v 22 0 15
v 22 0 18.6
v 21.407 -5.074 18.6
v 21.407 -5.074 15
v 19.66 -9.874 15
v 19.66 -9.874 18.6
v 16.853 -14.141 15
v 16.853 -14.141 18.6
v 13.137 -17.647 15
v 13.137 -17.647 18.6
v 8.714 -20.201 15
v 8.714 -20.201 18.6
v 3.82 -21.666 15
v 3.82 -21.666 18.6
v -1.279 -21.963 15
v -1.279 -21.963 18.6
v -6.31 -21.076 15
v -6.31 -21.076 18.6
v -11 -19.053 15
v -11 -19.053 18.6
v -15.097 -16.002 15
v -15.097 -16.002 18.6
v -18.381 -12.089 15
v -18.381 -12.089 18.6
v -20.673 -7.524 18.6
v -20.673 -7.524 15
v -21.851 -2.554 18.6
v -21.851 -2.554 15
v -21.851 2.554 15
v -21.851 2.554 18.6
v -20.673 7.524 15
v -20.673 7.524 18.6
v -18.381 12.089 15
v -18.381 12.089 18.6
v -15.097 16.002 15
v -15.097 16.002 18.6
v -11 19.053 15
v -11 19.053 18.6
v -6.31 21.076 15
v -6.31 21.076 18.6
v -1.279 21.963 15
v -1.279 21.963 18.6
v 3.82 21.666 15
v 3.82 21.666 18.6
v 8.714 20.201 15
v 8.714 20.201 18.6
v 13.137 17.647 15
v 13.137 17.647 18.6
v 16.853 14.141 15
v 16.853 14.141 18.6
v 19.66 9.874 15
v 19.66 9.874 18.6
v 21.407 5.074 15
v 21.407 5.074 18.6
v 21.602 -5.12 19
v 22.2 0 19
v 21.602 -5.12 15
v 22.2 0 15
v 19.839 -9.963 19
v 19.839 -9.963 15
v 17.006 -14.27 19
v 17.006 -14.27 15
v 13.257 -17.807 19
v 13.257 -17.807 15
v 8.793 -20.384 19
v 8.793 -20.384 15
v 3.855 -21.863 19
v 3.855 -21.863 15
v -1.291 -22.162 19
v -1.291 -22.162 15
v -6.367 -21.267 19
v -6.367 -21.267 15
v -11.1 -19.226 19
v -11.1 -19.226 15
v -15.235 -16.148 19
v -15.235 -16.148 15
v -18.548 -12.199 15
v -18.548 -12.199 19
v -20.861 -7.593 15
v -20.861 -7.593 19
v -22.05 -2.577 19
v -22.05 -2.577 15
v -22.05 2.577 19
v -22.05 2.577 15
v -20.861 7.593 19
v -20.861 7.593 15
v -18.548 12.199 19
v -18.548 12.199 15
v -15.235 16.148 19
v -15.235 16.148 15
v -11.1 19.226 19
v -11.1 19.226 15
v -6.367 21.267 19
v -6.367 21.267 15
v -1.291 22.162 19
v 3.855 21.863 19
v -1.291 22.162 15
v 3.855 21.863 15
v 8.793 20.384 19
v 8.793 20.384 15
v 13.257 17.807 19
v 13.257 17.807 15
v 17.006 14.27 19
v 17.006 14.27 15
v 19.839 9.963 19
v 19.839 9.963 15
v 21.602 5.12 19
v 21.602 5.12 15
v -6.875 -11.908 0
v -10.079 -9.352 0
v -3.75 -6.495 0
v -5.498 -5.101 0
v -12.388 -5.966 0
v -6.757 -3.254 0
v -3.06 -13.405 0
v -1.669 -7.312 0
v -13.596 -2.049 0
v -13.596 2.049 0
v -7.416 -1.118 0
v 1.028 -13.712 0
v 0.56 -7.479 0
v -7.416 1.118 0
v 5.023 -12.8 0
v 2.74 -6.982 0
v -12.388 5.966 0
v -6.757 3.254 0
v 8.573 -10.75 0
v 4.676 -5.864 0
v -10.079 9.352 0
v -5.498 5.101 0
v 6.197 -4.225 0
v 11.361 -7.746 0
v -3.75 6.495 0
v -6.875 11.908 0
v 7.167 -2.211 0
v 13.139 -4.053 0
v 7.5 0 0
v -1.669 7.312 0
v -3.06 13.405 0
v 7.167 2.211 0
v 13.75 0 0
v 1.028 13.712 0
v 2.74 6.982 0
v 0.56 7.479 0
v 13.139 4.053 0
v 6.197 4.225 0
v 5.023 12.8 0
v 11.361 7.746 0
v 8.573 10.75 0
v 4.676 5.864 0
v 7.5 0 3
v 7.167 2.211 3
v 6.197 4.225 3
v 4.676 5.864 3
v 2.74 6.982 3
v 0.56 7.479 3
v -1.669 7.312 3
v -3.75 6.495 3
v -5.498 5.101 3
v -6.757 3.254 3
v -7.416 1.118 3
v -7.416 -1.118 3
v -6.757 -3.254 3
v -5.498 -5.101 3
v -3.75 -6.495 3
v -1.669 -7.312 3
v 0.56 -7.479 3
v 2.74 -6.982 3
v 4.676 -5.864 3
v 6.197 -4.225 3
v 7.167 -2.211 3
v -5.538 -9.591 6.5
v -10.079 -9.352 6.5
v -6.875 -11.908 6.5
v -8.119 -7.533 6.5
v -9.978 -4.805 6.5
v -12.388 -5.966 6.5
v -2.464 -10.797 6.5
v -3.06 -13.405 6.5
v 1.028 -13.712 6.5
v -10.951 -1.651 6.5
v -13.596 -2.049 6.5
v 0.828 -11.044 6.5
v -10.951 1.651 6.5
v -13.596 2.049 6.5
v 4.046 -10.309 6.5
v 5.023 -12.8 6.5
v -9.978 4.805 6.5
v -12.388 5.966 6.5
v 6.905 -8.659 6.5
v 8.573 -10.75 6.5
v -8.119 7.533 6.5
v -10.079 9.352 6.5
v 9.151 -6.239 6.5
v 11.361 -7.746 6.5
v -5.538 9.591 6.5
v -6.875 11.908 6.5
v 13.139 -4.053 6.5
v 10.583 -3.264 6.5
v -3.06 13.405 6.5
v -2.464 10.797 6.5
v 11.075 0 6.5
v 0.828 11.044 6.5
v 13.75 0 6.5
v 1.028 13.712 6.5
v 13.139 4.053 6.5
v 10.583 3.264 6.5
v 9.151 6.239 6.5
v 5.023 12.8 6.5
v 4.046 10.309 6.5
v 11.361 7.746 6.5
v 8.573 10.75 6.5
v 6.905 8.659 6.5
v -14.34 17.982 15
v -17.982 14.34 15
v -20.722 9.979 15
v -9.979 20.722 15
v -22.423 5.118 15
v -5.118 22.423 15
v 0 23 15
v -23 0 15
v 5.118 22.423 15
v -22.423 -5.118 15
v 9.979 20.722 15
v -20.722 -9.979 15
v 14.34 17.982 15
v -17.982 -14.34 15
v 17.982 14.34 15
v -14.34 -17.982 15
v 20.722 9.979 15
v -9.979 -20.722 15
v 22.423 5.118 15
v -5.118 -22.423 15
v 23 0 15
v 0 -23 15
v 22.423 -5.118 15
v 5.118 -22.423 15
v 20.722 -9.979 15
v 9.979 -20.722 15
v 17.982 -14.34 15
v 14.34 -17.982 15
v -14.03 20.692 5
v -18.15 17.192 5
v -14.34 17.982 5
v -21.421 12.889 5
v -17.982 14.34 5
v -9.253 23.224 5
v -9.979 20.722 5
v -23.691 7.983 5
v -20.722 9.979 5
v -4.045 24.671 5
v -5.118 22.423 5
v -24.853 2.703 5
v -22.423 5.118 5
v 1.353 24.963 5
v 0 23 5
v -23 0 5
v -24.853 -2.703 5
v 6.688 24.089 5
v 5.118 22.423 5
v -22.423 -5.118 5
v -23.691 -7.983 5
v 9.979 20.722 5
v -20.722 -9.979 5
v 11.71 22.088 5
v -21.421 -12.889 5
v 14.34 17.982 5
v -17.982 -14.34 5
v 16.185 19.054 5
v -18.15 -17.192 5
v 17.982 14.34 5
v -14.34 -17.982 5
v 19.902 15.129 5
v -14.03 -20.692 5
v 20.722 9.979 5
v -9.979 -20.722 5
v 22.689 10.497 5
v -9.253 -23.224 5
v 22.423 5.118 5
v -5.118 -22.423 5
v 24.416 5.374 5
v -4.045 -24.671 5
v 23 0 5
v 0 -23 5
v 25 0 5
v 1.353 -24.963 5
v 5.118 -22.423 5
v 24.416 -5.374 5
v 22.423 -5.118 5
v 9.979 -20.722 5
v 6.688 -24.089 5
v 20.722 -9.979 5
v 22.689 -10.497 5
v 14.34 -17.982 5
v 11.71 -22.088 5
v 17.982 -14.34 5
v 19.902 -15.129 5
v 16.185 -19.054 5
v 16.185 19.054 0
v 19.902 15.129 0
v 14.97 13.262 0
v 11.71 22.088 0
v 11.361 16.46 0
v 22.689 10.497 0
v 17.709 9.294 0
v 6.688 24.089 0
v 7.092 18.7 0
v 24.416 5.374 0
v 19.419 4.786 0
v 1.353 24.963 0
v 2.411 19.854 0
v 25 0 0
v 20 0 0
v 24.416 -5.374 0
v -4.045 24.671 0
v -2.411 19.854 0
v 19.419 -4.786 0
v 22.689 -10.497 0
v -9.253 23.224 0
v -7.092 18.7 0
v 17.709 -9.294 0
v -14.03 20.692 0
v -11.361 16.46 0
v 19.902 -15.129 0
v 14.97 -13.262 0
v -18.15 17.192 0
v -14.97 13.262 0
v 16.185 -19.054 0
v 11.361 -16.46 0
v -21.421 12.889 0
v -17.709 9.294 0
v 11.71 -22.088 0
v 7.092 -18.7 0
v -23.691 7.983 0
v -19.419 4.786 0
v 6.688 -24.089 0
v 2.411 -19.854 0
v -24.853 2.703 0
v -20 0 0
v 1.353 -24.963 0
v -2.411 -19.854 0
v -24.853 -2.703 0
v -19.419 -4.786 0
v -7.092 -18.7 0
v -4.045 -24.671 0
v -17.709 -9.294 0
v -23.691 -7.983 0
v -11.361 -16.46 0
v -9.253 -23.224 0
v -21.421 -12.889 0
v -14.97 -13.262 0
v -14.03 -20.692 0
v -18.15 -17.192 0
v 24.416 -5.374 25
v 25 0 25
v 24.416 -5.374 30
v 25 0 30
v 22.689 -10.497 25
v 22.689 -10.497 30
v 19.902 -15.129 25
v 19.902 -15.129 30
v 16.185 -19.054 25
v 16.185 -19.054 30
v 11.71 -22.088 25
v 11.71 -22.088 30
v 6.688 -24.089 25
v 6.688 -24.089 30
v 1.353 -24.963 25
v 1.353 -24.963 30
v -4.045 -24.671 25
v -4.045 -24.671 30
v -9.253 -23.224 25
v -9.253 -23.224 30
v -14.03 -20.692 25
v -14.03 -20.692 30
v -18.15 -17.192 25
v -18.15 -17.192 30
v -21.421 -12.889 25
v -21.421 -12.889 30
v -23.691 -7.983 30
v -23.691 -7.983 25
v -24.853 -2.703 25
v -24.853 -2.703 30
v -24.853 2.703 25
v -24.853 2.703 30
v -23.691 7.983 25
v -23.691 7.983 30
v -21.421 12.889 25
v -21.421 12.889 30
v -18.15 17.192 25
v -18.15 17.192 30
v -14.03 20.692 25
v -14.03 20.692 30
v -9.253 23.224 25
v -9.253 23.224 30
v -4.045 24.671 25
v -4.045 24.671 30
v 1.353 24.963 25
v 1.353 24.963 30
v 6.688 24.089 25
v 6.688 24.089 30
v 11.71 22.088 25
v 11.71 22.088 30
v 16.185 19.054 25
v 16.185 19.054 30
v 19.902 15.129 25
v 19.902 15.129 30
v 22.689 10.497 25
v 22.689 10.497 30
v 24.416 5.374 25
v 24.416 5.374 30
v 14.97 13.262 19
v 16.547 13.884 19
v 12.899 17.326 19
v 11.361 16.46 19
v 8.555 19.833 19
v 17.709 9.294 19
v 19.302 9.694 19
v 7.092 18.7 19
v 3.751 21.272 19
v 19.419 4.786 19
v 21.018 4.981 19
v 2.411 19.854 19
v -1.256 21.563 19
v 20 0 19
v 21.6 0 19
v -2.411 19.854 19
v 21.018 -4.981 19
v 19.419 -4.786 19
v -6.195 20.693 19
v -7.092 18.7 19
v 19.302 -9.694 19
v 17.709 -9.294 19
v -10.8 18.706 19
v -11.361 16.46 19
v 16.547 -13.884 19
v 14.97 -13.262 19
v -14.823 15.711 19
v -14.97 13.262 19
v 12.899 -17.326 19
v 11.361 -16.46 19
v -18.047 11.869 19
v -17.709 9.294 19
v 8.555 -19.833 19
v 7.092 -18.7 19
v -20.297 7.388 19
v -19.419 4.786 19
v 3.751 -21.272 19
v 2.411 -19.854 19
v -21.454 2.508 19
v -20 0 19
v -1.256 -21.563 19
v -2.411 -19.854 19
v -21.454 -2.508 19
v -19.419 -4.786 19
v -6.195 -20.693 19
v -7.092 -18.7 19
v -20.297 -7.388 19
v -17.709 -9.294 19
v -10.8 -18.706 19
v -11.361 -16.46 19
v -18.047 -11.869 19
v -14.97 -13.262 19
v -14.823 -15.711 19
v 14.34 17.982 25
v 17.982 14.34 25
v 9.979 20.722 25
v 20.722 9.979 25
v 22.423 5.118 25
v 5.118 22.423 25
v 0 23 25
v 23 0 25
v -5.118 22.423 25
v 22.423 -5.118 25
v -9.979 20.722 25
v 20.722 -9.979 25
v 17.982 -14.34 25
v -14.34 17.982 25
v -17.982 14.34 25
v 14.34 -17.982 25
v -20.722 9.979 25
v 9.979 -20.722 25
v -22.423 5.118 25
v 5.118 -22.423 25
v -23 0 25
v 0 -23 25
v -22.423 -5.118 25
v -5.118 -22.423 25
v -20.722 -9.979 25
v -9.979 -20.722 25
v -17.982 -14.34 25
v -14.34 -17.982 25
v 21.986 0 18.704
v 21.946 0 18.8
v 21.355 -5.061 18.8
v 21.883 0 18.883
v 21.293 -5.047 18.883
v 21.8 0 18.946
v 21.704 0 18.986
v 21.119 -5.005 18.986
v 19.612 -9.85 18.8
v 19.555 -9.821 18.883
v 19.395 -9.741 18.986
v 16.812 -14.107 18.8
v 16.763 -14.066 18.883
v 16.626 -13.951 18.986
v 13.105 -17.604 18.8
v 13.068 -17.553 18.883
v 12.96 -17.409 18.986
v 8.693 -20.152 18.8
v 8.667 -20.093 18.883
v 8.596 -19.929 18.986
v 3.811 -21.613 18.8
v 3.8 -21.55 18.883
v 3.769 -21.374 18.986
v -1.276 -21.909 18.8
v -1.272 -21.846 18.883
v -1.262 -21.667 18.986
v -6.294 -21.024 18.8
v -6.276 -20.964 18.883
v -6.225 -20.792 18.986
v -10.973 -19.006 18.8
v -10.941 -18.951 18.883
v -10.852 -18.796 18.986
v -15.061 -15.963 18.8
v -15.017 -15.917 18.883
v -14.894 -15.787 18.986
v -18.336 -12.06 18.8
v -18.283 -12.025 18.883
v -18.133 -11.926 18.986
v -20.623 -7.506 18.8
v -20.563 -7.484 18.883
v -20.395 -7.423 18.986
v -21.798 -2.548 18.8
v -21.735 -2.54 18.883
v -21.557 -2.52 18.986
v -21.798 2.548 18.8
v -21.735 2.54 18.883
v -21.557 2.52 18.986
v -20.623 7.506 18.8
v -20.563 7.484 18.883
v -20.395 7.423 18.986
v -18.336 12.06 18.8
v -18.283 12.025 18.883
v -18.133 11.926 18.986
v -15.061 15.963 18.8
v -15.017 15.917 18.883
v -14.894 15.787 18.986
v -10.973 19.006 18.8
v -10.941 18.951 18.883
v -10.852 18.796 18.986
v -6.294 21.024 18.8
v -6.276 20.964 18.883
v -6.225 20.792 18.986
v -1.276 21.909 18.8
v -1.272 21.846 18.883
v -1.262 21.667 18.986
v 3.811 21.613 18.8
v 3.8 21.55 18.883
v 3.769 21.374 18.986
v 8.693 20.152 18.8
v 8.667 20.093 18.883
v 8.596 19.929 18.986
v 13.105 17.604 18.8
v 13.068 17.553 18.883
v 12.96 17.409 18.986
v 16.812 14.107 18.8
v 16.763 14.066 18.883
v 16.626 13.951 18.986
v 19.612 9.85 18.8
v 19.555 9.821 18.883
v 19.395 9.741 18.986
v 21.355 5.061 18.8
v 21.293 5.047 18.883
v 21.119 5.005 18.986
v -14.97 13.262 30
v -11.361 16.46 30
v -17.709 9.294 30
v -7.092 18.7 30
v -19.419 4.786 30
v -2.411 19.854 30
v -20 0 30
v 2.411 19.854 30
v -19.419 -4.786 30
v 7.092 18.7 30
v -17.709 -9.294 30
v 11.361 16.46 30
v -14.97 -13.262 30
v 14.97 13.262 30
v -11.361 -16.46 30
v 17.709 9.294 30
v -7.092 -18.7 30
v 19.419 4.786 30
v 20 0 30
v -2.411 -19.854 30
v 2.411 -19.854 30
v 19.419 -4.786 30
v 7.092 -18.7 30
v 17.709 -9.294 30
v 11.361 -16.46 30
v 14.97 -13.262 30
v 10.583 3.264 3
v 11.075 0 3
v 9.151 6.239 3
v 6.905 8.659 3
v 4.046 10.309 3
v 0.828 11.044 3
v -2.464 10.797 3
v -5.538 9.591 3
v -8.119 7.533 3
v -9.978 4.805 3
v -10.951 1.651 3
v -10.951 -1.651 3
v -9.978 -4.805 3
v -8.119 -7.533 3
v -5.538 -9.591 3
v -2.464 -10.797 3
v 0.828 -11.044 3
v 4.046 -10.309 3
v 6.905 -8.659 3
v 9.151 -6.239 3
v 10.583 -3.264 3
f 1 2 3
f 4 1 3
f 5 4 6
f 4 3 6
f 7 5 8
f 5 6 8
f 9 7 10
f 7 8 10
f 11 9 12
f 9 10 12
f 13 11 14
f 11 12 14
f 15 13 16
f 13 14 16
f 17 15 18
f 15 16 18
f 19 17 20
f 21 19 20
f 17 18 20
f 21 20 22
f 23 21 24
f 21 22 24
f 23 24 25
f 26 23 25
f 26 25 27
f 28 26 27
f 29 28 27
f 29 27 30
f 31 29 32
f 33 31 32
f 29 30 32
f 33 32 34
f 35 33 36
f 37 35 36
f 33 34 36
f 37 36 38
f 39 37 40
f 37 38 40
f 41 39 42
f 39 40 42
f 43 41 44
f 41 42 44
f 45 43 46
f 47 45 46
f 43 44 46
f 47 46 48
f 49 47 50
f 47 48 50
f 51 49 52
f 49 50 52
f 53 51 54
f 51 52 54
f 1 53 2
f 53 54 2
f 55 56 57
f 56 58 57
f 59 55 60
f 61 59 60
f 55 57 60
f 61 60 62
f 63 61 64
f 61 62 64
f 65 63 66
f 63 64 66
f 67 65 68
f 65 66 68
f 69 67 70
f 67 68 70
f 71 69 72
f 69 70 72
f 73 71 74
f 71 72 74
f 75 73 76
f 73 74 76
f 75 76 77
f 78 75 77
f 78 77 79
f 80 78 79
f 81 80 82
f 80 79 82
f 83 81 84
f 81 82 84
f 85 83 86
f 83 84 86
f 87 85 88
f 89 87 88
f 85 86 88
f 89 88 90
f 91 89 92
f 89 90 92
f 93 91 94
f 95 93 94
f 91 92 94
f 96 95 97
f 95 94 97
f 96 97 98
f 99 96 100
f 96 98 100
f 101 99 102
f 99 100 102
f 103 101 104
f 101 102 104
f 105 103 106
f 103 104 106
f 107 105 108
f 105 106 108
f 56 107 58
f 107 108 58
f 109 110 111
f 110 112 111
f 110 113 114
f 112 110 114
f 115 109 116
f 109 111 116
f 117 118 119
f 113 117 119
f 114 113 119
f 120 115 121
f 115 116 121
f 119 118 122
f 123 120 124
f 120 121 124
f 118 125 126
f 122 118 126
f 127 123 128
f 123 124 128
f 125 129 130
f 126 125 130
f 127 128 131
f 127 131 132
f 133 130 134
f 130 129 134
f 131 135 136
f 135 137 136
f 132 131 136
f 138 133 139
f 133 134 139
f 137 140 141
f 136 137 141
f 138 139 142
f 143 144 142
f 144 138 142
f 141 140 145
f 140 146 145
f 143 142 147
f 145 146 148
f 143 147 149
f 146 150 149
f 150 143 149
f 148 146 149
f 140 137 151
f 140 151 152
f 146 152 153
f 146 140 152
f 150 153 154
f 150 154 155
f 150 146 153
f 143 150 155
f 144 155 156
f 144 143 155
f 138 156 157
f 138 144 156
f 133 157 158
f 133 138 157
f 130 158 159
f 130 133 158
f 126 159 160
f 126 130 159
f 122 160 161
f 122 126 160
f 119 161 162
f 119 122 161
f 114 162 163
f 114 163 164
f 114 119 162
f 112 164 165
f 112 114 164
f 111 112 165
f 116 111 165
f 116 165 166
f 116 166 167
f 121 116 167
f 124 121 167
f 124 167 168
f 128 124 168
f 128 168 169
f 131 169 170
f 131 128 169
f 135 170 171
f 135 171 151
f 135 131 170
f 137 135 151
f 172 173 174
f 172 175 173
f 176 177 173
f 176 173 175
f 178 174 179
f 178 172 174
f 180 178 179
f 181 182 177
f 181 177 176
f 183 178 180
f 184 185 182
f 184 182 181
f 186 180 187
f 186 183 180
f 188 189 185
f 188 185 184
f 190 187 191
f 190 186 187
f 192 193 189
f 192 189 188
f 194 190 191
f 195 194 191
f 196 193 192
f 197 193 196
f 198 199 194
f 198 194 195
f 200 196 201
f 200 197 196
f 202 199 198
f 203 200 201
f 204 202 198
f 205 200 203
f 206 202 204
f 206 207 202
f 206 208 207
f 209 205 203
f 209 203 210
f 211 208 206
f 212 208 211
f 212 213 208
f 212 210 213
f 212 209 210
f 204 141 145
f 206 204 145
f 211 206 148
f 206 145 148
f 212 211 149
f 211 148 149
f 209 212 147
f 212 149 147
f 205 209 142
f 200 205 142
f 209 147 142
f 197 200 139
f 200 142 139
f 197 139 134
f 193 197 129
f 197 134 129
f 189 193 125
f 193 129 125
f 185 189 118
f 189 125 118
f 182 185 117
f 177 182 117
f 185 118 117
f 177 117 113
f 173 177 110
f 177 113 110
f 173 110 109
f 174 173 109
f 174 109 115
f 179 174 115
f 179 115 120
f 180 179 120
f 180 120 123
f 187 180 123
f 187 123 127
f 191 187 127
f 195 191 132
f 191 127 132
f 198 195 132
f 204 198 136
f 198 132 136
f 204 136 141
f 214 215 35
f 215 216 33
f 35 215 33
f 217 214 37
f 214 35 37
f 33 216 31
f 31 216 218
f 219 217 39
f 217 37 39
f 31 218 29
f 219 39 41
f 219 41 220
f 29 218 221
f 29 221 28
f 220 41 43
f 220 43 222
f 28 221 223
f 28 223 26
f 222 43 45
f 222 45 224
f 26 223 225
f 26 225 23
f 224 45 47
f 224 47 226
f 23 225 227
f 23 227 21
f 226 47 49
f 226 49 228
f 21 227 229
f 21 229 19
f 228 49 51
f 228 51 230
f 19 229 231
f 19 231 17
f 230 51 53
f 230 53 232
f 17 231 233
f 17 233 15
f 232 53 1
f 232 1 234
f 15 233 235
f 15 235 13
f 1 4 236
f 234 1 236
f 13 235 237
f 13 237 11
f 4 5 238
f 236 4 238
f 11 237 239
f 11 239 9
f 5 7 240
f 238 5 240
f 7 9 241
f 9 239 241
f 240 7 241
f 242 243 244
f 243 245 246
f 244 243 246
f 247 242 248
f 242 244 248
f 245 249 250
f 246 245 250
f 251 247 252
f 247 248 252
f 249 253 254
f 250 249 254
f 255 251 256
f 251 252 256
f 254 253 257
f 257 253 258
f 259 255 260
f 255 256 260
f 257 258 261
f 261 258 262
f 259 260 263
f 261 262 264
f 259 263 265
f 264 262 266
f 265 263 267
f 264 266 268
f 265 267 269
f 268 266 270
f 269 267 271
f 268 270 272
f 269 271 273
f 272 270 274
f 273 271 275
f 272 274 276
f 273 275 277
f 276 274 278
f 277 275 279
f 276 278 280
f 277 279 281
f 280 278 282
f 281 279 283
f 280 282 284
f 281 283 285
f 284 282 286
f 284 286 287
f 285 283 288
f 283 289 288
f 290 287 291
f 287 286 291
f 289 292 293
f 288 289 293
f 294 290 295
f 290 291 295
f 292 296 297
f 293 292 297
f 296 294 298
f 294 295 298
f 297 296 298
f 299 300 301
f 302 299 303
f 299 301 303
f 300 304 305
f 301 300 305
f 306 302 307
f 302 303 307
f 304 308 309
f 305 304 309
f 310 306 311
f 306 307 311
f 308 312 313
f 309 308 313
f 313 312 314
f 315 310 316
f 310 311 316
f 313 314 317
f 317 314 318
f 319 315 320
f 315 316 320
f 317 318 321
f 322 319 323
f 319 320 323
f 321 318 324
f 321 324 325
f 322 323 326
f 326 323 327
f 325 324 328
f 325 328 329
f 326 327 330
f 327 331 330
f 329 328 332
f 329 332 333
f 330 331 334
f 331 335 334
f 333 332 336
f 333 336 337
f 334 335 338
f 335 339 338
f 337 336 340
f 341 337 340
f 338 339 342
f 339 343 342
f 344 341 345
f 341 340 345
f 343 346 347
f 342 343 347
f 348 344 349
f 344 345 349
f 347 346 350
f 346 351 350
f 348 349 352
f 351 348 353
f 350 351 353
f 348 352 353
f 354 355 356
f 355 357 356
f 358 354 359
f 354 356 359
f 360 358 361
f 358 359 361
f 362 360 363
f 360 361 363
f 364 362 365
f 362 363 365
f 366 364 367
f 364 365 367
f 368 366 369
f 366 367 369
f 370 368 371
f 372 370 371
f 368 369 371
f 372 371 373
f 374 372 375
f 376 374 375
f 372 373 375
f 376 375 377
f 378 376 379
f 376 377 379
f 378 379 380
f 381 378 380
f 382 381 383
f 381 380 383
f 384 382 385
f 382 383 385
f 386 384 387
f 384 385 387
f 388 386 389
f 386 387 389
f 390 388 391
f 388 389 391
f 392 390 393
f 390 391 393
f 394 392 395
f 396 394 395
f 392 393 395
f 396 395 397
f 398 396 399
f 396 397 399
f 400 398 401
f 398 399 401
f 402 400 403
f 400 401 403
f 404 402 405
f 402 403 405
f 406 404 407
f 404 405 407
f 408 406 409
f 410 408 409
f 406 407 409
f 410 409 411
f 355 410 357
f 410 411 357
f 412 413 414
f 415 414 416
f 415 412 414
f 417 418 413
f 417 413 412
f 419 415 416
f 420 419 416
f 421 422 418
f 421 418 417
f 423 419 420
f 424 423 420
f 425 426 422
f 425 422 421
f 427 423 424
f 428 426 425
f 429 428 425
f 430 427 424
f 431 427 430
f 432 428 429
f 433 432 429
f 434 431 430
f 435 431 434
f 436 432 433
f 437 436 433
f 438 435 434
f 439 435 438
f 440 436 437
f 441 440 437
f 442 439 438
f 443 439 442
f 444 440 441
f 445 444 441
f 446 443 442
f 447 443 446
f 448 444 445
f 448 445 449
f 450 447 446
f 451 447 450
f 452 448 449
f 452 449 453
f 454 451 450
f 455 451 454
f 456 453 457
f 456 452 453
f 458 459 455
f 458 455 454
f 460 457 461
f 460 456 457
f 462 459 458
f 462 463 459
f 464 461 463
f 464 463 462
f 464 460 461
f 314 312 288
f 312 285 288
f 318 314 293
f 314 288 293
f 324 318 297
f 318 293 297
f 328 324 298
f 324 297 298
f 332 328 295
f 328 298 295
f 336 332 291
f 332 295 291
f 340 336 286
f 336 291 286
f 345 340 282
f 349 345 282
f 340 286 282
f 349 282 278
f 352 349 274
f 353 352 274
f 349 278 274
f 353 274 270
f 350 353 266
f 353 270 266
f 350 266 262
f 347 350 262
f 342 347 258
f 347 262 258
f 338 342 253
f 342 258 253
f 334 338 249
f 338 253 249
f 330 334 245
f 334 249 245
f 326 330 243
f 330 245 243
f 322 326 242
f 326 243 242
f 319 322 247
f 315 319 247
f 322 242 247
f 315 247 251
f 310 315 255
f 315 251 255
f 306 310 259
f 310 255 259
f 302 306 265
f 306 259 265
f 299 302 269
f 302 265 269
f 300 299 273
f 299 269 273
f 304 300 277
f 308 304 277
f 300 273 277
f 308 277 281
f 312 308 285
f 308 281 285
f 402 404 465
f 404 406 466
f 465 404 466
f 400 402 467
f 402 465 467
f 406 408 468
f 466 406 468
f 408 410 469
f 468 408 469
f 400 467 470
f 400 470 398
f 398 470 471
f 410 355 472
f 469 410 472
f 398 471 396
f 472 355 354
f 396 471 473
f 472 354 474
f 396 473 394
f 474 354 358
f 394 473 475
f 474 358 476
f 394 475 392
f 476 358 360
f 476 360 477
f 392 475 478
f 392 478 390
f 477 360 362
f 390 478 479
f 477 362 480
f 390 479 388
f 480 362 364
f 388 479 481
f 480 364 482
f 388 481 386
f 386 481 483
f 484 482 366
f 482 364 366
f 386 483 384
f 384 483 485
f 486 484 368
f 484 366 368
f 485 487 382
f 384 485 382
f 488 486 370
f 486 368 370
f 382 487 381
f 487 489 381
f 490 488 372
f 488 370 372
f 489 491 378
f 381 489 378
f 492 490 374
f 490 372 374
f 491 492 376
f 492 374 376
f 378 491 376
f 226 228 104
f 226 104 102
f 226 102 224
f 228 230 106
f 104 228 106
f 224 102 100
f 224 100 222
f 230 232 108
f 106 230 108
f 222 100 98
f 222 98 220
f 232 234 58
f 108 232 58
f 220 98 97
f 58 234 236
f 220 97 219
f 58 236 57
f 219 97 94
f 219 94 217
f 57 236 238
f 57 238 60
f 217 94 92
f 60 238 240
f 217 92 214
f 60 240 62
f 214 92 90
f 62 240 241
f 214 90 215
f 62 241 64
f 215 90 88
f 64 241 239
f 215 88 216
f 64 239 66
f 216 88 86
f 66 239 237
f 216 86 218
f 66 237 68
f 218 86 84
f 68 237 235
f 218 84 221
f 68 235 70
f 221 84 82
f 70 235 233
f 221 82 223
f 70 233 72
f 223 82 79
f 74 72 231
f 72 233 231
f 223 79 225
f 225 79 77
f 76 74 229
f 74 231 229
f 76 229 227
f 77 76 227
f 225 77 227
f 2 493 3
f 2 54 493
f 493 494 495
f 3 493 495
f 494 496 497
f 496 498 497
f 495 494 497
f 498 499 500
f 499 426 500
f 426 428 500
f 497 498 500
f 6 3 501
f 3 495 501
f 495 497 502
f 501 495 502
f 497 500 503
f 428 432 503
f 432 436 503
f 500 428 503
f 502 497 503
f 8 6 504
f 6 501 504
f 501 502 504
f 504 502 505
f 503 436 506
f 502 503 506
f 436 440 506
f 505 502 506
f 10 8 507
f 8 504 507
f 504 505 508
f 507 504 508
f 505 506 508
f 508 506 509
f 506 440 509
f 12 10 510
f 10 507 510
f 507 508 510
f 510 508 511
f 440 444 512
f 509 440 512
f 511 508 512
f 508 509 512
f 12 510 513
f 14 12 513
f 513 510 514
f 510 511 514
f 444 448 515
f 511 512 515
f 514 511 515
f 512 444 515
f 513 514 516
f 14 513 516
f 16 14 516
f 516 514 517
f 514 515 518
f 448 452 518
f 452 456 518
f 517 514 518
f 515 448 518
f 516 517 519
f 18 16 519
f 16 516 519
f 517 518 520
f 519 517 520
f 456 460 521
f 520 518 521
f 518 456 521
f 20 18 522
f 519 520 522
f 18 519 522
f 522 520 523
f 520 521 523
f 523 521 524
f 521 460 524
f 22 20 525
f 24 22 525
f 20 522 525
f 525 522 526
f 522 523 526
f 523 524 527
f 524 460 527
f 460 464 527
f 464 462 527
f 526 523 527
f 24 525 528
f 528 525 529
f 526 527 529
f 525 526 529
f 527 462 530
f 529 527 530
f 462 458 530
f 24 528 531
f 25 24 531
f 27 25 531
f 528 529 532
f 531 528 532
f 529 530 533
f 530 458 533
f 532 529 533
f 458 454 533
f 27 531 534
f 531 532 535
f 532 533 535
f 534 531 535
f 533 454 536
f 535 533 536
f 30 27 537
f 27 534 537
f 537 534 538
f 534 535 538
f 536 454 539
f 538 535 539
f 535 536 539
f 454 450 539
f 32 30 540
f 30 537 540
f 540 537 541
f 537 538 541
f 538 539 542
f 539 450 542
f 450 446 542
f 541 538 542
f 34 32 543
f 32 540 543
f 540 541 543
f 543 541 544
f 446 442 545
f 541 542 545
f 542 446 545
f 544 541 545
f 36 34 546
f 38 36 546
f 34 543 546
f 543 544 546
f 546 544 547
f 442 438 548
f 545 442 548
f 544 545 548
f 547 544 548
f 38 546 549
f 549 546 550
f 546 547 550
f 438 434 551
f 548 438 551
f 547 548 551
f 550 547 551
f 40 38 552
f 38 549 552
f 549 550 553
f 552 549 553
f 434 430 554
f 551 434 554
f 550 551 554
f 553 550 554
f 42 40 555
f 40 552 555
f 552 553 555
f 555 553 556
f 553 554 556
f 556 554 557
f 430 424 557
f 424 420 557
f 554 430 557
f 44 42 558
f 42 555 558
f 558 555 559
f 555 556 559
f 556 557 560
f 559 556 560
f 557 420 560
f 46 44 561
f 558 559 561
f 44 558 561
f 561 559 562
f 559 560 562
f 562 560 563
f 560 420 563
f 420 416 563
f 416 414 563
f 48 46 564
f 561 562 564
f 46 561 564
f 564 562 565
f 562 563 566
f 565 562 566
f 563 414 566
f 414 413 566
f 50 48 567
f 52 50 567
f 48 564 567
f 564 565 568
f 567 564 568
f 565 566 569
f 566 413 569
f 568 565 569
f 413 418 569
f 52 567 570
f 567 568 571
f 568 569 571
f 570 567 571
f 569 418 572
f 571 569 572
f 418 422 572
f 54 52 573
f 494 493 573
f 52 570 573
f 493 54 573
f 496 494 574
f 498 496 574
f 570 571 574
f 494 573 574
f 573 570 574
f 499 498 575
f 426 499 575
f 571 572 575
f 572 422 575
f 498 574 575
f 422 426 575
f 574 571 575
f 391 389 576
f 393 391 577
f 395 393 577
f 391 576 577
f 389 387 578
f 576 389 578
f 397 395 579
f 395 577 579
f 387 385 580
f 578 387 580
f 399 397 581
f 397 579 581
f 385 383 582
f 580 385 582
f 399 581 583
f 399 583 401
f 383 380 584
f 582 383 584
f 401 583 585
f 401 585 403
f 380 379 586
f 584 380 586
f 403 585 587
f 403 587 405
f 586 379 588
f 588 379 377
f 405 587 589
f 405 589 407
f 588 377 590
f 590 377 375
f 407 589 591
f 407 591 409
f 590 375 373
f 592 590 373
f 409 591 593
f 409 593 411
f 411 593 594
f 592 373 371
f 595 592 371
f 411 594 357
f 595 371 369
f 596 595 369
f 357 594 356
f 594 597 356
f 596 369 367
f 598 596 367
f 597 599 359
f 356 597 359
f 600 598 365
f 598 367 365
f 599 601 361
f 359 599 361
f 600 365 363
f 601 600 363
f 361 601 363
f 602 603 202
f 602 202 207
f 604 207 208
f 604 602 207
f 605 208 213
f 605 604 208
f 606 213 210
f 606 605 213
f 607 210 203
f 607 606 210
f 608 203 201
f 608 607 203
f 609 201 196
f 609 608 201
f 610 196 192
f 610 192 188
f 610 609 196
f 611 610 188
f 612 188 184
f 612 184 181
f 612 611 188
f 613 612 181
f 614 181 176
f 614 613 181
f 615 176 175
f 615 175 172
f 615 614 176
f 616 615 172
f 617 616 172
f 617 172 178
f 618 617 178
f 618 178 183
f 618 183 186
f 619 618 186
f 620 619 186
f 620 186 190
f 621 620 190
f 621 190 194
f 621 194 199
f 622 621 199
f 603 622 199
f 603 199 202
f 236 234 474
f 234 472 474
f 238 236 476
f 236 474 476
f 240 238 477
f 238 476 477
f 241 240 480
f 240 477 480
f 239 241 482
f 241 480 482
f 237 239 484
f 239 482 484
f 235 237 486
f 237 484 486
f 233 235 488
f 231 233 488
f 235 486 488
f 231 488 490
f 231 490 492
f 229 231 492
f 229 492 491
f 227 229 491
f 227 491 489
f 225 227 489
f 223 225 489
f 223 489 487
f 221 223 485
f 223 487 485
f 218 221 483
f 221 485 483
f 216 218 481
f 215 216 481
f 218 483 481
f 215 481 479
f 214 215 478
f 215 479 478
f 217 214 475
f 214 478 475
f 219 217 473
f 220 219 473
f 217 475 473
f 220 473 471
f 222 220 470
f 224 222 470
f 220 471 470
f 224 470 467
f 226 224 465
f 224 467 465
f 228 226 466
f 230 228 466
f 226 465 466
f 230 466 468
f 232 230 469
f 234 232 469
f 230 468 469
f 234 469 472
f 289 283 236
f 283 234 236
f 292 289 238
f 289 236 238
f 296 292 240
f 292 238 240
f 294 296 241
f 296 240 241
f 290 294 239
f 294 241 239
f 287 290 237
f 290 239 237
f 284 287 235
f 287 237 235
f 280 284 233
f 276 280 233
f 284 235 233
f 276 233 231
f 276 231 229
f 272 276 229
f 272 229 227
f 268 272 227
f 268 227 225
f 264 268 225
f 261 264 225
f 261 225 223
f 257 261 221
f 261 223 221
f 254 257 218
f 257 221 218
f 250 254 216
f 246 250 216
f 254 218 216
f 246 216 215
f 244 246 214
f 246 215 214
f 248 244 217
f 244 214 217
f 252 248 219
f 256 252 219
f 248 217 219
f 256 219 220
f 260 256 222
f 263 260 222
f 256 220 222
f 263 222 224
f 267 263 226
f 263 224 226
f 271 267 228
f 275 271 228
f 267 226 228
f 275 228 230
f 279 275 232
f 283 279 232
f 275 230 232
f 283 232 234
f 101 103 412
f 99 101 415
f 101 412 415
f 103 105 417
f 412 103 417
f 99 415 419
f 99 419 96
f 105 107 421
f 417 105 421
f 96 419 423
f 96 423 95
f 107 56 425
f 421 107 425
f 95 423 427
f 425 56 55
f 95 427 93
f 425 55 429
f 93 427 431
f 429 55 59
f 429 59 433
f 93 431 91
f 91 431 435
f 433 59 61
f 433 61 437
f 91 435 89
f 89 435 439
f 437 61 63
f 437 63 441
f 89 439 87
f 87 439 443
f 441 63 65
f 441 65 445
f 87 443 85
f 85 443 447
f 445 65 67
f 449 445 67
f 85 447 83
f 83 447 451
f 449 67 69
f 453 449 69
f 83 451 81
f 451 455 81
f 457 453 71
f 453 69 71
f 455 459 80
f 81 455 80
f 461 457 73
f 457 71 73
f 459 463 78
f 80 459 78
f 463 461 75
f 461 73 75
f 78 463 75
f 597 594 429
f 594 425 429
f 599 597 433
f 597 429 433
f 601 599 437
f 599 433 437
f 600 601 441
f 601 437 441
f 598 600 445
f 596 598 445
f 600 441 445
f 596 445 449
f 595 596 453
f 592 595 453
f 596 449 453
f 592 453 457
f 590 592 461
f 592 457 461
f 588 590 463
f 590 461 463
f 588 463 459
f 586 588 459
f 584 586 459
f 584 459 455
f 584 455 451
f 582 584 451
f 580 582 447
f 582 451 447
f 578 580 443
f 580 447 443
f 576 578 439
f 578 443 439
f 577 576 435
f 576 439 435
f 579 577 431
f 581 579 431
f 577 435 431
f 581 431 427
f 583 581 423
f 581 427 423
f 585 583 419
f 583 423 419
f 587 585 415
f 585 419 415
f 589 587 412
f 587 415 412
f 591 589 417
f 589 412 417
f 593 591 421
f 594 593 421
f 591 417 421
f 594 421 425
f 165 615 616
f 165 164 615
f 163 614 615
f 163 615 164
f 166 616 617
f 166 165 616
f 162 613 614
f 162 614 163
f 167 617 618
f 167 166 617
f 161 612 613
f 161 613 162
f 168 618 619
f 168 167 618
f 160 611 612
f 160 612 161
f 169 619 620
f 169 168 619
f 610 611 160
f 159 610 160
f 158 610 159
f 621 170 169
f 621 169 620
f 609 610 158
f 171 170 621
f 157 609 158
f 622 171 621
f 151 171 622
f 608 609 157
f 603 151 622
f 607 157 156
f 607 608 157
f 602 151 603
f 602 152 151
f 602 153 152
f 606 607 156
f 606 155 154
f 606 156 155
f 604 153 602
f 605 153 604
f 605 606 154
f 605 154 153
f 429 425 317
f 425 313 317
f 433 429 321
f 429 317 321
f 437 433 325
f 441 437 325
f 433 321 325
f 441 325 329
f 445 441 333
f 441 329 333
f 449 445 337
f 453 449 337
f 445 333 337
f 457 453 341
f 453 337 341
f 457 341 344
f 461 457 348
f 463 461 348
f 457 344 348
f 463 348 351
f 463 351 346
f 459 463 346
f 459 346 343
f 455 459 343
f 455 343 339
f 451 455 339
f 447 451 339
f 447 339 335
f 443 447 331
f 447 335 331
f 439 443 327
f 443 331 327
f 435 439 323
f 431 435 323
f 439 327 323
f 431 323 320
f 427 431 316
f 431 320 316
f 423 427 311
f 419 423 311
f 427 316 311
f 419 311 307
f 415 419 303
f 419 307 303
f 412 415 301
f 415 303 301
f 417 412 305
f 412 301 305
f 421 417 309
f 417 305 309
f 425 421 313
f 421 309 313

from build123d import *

# Parameters (mm, degrees)
F0_R     = 13.75
F0_R_2   = 11.075
F2_DEPTH = 6.5
F0_R_3   = 7.5
F3_DEPTH = 3
F4_W     = 2
F4_H     = 4
F8_R     = 0.4


with BuildPart() as f2:
    # F0 (on Top) → F2 (new body)
    with BuildSketch(Plane.XY):
        Circle(F0_R)
        Circle(F0_R_2, mode=Mode.SUBTRACT)
    extrude(amount=F2_DEPTH)

    # F0 (on Top) → F3 (join)
    with BuildSketch(Plane.XY):
        Circle(F0_R_2)
        Circle(F0_R_3, mode=Mode.SUBTRACT)
    extrude(amount=F3_DEPTH)


with BuildPart() as f6:
    # F4 (on Front) → F6 (revolve)
    with BuildSketch(Plane.XZ):
        Polygon((23, 5), (23, 15), (22, 15), (20, 15), (20, 0), (25, 0), (25, 5), align=None)
        with Locations((21, 17)):
            Rectangle(F4_W, F4_H)
    revolve(axis=Axis((0, 0, 0), (0, 0, -1)))

    # F8
    f8_edges = [f6.edges().sort_by_distance(p)[0] for p in [
        (-22, 0, 19),
    ]]
    fillet(f8_edges, radius=F8_R)


with BuildPart() as f7:
    # F5 (on Front) → F7 (revolve)
    with BuildSketch(Plane.XZ):
        Polygon((25, 30), (20, 30), (20, 19), (22.2, 19), (22.2, 15), (23, 15), (23, 25), (25, 25), align=None)
    revolve(axis=Axis((0, 0, 0), (0, 0, -1)))


solid = Compound([f2.part, f6.part, f7.part])
